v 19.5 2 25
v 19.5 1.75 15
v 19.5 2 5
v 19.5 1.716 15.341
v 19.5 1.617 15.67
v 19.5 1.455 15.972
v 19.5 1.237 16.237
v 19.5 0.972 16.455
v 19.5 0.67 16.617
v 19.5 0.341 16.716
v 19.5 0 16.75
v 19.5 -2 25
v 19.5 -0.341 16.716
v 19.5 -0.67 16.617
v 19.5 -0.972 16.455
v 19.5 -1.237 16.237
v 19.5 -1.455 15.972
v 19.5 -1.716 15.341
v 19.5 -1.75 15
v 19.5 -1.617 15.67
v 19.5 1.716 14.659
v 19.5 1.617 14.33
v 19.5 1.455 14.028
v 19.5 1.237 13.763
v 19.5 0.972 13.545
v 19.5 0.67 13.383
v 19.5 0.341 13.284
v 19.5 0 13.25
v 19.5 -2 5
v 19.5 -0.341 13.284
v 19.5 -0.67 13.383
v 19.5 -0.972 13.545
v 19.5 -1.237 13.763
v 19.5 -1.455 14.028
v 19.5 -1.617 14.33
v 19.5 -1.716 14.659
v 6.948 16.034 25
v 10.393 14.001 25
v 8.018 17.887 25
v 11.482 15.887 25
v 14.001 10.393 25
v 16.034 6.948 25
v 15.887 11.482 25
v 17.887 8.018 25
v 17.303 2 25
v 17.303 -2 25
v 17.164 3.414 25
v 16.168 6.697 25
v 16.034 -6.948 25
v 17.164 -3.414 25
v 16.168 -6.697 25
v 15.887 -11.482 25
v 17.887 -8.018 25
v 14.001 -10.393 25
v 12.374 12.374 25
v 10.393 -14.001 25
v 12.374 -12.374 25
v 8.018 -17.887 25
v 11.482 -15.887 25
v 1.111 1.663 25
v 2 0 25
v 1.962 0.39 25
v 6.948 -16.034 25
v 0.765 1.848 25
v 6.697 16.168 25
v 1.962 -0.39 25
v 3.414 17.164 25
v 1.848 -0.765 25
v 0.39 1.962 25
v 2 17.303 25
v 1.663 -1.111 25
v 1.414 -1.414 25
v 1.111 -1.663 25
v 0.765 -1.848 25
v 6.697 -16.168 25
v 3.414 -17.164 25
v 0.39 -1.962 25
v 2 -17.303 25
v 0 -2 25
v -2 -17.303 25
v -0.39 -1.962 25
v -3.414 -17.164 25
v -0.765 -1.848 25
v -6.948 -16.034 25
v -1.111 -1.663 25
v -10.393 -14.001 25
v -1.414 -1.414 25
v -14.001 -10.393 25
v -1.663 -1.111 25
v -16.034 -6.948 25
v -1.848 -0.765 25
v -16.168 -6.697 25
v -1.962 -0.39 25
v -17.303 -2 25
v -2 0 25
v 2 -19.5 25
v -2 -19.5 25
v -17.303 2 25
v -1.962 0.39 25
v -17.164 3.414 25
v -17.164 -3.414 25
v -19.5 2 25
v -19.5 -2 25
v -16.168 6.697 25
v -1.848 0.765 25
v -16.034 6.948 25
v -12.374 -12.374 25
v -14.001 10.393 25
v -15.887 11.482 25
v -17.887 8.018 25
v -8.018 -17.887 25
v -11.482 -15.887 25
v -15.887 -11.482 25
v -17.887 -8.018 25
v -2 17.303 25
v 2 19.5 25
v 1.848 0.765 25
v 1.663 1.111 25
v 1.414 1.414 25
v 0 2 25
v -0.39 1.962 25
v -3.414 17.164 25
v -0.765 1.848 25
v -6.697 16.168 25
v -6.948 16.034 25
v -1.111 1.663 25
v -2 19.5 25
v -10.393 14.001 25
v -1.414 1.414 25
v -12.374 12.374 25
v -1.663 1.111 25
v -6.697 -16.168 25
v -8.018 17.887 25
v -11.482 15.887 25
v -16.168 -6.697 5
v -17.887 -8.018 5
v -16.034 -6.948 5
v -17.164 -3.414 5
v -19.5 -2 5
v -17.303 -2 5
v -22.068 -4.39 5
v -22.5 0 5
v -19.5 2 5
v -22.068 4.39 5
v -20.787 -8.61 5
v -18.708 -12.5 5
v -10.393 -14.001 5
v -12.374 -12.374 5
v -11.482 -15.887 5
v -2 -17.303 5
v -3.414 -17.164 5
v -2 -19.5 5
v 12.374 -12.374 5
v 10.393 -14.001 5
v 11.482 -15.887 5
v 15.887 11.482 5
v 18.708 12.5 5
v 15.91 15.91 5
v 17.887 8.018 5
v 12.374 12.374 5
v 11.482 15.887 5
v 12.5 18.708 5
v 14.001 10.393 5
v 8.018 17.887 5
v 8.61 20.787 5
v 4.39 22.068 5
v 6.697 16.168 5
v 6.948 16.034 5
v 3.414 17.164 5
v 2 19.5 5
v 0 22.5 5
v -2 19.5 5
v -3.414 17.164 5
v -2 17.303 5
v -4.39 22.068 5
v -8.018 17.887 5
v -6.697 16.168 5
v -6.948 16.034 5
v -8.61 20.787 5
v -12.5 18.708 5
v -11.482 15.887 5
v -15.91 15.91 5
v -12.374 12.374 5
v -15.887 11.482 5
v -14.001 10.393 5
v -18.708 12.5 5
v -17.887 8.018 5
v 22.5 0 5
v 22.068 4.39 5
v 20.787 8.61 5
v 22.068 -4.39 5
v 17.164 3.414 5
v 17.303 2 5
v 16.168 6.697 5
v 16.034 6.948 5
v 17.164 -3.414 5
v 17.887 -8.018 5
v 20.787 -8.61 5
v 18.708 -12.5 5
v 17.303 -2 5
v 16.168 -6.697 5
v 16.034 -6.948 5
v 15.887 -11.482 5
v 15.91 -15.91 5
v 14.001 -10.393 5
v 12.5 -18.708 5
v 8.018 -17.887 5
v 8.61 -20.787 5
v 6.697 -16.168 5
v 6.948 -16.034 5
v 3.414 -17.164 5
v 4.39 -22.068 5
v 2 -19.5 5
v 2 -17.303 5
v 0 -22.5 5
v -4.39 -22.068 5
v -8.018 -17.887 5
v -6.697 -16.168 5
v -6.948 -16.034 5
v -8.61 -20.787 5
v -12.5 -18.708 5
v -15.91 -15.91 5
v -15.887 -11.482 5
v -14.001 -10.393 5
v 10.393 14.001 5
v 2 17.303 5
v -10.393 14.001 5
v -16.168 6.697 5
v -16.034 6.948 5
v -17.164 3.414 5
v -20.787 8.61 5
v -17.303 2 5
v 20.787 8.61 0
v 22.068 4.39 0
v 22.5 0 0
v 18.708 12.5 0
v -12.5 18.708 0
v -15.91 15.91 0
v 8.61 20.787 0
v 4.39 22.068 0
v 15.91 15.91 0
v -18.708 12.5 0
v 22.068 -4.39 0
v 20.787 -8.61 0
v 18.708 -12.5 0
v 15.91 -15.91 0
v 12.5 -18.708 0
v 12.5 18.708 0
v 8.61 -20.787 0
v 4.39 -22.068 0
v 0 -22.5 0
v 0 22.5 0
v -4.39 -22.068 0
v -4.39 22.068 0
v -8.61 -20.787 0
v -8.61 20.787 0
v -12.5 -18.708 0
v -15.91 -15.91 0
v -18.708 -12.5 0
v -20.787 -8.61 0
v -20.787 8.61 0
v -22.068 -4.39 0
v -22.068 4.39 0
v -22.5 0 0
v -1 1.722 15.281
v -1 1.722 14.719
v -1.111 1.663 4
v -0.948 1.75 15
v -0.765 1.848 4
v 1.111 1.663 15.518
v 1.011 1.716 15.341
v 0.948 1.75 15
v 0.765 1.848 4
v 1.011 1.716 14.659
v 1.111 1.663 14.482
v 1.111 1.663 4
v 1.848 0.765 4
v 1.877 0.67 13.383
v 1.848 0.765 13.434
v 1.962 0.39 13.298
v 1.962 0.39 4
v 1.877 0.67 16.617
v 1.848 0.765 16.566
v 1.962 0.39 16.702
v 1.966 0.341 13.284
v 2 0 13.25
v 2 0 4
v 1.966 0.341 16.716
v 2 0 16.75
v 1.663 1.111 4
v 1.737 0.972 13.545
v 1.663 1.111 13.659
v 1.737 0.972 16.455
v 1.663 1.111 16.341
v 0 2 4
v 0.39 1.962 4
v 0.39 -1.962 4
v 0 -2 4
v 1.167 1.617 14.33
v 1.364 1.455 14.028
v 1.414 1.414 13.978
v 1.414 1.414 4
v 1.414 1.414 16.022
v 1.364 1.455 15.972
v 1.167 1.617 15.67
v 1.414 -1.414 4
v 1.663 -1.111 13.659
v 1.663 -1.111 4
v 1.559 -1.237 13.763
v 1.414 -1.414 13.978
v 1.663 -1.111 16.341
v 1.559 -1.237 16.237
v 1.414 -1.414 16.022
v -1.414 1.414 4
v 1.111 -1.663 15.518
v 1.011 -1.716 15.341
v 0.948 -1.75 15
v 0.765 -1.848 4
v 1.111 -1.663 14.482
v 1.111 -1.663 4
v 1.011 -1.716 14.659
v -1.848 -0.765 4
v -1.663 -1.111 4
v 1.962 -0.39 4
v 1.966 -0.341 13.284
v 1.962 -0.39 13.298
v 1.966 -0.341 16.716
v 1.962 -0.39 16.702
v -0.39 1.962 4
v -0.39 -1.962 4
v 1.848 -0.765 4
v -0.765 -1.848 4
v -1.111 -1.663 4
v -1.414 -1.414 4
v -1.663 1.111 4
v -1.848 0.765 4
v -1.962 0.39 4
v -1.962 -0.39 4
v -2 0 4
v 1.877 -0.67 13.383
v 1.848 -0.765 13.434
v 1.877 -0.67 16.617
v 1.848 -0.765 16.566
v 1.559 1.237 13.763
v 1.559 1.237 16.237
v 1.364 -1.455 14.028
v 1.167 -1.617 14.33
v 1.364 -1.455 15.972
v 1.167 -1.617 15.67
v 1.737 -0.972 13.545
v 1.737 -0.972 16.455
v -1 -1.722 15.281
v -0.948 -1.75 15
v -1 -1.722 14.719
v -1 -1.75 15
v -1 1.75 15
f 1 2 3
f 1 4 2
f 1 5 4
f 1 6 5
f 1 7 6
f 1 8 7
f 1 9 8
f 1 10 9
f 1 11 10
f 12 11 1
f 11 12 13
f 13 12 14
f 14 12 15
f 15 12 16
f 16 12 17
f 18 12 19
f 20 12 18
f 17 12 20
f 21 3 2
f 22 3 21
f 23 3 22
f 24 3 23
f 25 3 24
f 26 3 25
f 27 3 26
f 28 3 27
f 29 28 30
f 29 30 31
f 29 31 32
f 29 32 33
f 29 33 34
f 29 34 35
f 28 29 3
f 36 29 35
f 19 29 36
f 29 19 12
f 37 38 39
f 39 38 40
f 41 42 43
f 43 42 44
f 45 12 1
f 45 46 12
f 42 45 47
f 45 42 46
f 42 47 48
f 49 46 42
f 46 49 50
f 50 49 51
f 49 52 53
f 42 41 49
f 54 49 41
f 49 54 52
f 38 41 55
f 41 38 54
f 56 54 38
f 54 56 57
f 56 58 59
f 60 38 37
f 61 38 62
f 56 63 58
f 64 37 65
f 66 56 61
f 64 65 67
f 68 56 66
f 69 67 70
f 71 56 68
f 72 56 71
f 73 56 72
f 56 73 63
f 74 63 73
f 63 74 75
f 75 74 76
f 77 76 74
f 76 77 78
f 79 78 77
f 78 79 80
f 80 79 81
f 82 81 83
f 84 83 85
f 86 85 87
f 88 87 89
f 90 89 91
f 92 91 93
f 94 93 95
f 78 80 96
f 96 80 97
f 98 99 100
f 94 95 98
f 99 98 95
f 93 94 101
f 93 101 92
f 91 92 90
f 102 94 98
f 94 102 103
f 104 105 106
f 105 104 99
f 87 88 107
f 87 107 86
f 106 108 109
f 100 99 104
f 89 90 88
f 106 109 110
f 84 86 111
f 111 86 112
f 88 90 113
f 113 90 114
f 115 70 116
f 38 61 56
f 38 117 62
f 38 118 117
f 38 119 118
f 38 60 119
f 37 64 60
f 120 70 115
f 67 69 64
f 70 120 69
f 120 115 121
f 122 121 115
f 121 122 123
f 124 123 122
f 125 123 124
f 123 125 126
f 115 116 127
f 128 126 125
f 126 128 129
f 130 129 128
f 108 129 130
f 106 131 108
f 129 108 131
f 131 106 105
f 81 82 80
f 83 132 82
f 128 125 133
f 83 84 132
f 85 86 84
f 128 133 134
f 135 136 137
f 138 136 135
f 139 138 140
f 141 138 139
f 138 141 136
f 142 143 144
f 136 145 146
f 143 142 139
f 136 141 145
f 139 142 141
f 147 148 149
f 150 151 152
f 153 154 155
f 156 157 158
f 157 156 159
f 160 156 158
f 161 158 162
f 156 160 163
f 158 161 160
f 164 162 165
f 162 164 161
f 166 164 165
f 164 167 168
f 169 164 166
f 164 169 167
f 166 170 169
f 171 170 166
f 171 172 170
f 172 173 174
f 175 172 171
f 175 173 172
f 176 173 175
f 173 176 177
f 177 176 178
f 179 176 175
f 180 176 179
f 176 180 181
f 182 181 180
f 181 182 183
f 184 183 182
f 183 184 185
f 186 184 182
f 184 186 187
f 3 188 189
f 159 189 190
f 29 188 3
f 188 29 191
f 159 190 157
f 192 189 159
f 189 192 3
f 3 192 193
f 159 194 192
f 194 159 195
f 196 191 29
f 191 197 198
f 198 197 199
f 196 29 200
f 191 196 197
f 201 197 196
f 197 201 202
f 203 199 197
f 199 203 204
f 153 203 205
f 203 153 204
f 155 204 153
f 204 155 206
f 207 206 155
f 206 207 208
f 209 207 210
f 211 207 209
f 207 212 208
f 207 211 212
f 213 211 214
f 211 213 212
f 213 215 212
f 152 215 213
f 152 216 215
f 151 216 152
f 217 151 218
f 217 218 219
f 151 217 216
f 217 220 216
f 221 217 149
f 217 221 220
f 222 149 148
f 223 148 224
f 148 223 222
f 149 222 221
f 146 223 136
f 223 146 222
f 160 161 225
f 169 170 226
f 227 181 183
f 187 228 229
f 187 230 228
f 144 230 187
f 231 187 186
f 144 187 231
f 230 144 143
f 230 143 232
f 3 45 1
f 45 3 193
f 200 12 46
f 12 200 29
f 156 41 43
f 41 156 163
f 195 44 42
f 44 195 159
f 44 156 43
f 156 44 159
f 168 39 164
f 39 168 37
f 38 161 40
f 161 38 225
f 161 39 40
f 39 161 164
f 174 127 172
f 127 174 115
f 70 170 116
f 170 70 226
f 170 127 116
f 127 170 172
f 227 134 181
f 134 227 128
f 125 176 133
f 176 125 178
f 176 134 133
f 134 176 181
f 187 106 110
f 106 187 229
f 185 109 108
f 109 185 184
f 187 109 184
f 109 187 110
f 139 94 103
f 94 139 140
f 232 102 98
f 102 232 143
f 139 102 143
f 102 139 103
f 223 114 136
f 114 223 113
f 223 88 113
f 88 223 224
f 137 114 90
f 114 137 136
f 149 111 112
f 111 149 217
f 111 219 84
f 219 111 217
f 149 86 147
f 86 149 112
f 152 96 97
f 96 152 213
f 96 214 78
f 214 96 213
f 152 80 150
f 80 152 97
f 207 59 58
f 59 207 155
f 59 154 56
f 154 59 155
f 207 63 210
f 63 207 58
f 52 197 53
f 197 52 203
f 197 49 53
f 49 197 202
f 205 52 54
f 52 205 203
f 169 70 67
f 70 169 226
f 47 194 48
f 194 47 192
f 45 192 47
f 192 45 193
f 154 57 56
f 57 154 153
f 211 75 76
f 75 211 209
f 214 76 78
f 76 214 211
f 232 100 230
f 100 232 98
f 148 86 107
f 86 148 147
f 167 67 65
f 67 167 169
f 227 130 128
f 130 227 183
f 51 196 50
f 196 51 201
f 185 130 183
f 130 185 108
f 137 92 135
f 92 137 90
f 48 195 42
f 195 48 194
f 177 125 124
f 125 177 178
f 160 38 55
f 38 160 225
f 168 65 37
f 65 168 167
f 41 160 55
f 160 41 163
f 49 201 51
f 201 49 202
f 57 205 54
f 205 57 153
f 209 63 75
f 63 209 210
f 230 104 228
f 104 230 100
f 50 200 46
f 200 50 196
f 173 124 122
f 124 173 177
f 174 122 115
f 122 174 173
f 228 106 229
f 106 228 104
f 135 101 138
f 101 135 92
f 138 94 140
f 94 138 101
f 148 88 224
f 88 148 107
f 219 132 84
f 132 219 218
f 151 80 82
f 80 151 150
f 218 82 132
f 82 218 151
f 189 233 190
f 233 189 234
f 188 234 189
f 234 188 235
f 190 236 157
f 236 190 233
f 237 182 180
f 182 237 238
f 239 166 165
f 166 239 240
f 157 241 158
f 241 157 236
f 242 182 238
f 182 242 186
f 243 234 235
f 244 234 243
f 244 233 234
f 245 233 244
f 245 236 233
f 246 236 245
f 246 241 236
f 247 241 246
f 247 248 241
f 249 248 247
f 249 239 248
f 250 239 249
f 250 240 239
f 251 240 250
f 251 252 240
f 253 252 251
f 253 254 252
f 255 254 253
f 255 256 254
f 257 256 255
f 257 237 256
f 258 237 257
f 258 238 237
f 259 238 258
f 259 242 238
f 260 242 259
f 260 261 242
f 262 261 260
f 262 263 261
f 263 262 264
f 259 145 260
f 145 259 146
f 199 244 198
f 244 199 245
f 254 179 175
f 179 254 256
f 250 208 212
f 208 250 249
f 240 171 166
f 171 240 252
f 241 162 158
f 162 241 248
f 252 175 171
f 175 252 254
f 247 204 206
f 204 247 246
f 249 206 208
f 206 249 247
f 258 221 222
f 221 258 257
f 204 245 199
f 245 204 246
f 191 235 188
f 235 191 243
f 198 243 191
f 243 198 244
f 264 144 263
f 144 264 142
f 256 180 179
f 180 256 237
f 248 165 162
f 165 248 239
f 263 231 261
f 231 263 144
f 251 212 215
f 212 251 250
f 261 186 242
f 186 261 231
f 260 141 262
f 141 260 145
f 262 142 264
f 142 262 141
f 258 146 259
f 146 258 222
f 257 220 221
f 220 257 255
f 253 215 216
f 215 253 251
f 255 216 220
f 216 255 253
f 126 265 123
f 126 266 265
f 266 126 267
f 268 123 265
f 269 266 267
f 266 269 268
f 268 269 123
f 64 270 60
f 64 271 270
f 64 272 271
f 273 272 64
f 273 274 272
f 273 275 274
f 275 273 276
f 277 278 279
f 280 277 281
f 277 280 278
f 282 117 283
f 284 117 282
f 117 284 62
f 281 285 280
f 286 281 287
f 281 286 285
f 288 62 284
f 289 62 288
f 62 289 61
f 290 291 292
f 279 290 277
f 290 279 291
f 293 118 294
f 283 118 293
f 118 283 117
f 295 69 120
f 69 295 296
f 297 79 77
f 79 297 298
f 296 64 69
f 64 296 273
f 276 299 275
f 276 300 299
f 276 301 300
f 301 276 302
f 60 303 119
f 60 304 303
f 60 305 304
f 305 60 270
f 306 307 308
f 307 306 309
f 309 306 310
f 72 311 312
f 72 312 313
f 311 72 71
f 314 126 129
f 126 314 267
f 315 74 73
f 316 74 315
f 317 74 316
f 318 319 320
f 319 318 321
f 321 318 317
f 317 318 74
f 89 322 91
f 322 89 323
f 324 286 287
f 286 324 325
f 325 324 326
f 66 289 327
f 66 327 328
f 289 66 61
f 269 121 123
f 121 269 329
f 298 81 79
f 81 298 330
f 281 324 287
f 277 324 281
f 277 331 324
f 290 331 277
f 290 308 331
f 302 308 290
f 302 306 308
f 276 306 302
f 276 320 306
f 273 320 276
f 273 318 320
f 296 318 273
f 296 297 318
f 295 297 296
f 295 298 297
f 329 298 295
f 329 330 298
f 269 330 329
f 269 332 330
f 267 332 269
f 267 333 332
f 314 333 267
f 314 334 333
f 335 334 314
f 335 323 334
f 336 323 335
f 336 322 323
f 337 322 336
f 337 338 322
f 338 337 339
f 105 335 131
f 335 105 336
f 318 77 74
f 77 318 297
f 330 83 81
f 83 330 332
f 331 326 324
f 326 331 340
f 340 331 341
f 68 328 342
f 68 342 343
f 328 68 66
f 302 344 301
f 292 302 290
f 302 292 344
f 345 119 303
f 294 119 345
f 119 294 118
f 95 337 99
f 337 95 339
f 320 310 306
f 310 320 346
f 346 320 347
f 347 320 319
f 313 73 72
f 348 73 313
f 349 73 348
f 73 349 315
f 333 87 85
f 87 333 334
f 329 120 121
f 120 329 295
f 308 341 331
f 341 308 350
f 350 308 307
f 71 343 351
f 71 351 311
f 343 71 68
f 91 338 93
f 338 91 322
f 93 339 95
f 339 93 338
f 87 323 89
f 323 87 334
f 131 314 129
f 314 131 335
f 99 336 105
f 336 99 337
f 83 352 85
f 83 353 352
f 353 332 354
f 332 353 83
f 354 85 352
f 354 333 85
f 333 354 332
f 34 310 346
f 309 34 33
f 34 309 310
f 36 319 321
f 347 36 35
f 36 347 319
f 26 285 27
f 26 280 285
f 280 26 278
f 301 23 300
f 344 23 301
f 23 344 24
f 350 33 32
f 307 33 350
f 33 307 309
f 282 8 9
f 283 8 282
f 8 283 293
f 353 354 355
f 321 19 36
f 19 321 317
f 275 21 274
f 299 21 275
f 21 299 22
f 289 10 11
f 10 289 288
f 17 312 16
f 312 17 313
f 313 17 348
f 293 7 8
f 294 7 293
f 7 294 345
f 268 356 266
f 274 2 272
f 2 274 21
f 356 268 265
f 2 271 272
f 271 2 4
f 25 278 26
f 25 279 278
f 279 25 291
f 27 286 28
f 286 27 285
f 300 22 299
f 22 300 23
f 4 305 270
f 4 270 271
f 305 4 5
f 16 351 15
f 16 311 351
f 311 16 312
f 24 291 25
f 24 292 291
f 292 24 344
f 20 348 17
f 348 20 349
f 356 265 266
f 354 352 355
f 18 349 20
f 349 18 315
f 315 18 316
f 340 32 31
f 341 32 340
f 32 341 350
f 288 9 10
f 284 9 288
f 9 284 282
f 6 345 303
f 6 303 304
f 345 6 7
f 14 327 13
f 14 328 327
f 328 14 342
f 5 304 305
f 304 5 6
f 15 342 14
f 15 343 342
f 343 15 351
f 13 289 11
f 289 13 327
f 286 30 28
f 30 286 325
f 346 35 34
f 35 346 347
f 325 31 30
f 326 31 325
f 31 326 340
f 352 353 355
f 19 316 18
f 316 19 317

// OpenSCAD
$fn = 32;

// ----------------------------------------------------------------------
// Control knob: skirt knob with grip ribs
// ----------------------------------------------------------------------

// --- parameters (mm) ---
skirt_d = 45;             // skirt diameter
skirt_t = 5;              // skirt thickness
rib_w = 4;                // grip rib width
rib_out = 3;              // grip rib radial protrusion
n_ribs = 12;              // number of grip ribs
knob_d = 35;              // knob body diameter
knob_h = 20;              // knob body height
bore_d = 4;               // shaft bore diameter
set_d = 3.5;              // set screw bore diameter

rib_step = 360 / n_ribs;  // rib angular step
total_h = skirt_t + knob_h;  // overall height

difference() {
  union() {
    translate([0, 0, skirt_t]) cylinder(h = knob_h, d = knob_d);
    cylinder(h = skirt_t, d = skirt_d);
    for (i = [0 : n_ribs - 1])
      rotate([0, 0, i * rib_step])
        translate([knob_d / 2 - 1, -rib_w / 2, skirt_t])
          cube([rib_out, rib_w, knob_h]);
  }
  translate([0, 0, skirt_t - 1]) cylinder(h = knob_h + 2, d = bore_d);
  translate([-1, 0, skirt_t + knob_h / 2]) rotate([0, 90, 0])
    cylinder(h = knob_d / 2 + bore_d / 2 + 2, d = set_d);
}
